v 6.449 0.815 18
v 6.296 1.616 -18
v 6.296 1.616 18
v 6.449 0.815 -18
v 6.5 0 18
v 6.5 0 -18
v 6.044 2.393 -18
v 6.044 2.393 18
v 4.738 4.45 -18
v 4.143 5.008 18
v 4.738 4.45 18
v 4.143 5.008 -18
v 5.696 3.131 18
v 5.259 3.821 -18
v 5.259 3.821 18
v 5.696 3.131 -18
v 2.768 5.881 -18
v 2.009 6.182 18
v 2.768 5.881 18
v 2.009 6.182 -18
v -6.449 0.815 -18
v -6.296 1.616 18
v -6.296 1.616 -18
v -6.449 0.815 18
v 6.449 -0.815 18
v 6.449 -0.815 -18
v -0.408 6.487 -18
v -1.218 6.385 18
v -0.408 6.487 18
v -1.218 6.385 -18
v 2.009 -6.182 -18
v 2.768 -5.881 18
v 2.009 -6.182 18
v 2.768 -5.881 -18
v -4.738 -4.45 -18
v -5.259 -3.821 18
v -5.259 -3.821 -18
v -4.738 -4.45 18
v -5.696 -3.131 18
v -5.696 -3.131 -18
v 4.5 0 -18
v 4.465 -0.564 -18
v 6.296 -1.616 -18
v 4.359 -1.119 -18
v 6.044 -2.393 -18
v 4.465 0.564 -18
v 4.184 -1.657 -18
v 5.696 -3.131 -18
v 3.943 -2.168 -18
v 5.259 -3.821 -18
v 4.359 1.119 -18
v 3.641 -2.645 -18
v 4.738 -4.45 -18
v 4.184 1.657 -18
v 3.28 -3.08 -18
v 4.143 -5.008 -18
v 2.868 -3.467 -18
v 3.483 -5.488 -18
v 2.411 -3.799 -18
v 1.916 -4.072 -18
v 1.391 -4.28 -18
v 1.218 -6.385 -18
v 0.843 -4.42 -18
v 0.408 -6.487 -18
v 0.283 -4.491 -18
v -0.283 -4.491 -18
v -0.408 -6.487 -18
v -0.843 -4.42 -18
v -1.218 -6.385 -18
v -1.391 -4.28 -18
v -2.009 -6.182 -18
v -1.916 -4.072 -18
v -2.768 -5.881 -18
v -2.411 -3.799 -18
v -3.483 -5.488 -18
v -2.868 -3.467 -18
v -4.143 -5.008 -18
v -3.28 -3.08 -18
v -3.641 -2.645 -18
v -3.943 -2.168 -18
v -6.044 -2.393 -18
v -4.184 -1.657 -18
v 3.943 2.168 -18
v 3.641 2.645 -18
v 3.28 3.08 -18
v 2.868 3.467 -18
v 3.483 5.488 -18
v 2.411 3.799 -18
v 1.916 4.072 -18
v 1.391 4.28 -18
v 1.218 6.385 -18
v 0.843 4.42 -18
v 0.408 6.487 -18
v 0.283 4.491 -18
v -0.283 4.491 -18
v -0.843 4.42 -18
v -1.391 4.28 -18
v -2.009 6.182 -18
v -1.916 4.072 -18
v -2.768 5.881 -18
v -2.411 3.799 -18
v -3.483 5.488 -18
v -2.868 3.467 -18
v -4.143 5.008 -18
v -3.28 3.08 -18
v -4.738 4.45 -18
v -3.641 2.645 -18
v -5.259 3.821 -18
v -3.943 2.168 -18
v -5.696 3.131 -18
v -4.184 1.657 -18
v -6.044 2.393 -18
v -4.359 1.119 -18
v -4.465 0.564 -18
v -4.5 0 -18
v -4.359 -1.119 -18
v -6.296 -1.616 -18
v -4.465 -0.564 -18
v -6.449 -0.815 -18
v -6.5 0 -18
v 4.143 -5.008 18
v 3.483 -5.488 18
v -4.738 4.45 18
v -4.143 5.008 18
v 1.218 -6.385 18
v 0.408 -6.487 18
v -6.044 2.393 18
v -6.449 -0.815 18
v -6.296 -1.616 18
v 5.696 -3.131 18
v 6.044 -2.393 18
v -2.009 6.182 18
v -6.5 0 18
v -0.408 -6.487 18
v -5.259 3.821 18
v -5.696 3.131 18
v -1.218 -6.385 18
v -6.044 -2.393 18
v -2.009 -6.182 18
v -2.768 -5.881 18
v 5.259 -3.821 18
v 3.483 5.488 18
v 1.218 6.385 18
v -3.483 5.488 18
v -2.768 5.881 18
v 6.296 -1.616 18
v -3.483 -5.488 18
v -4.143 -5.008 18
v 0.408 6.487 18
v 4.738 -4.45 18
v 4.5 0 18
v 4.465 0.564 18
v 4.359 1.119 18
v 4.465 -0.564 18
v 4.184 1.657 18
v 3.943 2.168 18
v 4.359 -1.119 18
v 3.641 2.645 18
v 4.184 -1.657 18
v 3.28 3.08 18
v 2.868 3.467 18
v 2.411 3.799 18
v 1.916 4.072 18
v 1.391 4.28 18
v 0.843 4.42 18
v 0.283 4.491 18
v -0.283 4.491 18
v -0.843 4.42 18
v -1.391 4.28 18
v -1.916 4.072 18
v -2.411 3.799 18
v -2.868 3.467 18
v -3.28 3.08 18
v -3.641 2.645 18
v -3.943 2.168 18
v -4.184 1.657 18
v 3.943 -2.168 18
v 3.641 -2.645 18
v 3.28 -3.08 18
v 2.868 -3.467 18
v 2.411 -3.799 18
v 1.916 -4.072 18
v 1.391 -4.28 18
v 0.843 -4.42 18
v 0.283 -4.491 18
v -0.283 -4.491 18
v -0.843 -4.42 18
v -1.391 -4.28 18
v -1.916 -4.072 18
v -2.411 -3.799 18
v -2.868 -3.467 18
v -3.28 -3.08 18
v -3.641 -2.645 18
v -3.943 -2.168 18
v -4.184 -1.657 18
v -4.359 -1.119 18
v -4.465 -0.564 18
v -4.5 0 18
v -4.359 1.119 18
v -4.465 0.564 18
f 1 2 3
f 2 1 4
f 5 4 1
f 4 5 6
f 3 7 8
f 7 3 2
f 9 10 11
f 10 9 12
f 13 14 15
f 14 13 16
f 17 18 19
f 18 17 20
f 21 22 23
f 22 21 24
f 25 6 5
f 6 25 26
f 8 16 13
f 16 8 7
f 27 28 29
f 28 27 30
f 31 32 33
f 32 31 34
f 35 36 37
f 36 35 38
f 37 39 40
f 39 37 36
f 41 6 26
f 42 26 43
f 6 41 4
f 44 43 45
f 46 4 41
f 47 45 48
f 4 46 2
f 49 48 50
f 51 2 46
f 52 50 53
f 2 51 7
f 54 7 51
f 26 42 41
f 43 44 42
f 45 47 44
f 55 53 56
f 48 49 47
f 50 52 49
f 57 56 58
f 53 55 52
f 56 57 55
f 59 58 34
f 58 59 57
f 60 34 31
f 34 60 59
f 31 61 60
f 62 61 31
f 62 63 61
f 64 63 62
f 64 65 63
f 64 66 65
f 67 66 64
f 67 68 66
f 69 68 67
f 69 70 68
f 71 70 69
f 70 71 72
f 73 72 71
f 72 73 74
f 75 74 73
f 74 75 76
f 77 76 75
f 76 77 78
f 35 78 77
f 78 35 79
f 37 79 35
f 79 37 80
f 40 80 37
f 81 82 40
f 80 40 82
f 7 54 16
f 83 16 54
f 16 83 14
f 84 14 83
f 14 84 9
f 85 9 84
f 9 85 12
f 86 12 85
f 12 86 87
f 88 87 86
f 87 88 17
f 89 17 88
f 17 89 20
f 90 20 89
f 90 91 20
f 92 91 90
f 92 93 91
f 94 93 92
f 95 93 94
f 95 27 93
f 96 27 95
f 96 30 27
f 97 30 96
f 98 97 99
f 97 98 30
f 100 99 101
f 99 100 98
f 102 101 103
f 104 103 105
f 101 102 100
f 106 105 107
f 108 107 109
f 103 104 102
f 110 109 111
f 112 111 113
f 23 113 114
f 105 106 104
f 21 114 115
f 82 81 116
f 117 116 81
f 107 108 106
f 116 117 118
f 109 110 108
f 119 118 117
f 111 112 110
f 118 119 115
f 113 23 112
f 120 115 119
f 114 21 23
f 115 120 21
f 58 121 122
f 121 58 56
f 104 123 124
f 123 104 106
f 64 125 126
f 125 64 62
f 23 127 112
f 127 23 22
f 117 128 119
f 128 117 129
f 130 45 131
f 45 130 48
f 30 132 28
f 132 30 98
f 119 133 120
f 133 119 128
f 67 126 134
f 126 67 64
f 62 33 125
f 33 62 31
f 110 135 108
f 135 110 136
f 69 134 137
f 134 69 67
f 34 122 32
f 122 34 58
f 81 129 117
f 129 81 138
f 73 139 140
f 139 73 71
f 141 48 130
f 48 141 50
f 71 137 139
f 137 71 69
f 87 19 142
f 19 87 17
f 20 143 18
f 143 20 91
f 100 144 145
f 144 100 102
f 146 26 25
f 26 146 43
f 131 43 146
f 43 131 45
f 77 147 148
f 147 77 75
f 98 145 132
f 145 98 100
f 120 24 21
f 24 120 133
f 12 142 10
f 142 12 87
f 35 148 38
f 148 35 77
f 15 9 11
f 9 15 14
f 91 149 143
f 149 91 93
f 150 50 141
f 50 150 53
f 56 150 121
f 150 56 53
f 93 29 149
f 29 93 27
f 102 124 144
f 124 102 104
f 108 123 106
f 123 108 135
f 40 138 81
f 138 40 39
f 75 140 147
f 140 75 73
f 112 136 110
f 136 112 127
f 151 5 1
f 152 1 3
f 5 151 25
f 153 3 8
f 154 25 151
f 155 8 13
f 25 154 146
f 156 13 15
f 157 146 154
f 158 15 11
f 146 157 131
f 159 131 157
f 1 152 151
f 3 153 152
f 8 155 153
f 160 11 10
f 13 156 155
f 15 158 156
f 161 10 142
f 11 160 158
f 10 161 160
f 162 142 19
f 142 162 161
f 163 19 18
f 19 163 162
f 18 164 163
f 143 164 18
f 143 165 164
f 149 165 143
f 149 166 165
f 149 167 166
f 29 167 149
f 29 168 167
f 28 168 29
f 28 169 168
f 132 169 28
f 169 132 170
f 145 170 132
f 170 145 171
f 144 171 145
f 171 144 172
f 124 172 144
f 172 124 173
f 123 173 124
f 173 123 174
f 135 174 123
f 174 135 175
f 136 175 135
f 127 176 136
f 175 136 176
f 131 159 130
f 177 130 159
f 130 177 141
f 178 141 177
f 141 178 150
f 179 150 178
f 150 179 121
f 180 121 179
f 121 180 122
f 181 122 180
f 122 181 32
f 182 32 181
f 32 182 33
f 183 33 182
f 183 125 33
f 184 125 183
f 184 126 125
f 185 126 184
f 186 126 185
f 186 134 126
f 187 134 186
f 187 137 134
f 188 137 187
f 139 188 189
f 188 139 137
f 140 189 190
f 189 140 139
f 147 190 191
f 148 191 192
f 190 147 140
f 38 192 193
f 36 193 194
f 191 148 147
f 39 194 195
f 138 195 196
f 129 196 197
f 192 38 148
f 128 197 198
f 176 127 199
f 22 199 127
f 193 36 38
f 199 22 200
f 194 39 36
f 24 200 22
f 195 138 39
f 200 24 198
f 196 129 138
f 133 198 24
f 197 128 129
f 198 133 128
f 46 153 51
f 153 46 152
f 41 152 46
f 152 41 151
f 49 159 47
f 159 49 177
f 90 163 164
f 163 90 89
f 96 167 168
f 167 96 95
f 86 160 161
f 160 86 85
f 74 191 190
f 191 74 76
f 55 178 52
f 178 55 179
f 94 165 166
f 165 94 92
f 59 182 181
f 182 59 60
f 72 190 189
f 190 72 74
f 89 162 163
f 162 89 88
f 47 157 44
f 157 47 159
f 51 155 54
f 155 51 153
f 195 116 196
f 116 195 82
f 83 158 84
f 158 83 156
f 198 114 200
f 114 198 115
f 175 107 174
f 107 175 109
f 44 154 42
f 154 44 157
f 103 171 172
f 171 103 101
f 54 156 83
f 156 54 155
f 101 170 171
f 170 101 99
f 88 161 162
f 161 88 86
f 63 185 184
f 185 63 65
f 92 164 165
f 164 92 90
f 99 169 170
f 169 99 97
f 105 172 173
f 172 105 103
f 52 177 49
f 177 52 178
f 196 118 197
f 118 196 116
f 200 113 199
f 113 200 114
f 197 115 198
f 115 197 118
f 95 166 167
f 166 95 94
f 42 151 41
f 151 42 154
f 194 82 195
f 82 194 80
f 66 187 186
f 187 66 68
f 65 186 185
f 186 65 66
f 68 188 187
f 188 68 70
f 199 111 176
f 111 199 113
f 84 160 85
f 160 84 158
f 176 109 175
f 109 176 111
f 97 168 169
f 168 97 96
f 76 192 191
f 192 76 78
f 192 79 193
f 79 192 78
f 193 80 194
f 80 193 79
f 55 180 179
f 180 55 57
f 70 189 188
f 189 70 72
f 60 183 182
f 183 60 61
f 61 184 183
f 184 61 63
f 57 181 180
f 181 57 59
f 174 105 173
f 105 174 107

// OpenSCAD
$fn = 50;


difference() {
	union() {
		translate(v = [0, 0, -18.0000000000]) {
			cylinder(h = 36, r = 6.5000000000);
		}
	}
	union() {
		translate(v = [0, 0, -100.0000000000]) {
			cylinder(h = 200, r = 4.5000000000);
		}
	}
}
